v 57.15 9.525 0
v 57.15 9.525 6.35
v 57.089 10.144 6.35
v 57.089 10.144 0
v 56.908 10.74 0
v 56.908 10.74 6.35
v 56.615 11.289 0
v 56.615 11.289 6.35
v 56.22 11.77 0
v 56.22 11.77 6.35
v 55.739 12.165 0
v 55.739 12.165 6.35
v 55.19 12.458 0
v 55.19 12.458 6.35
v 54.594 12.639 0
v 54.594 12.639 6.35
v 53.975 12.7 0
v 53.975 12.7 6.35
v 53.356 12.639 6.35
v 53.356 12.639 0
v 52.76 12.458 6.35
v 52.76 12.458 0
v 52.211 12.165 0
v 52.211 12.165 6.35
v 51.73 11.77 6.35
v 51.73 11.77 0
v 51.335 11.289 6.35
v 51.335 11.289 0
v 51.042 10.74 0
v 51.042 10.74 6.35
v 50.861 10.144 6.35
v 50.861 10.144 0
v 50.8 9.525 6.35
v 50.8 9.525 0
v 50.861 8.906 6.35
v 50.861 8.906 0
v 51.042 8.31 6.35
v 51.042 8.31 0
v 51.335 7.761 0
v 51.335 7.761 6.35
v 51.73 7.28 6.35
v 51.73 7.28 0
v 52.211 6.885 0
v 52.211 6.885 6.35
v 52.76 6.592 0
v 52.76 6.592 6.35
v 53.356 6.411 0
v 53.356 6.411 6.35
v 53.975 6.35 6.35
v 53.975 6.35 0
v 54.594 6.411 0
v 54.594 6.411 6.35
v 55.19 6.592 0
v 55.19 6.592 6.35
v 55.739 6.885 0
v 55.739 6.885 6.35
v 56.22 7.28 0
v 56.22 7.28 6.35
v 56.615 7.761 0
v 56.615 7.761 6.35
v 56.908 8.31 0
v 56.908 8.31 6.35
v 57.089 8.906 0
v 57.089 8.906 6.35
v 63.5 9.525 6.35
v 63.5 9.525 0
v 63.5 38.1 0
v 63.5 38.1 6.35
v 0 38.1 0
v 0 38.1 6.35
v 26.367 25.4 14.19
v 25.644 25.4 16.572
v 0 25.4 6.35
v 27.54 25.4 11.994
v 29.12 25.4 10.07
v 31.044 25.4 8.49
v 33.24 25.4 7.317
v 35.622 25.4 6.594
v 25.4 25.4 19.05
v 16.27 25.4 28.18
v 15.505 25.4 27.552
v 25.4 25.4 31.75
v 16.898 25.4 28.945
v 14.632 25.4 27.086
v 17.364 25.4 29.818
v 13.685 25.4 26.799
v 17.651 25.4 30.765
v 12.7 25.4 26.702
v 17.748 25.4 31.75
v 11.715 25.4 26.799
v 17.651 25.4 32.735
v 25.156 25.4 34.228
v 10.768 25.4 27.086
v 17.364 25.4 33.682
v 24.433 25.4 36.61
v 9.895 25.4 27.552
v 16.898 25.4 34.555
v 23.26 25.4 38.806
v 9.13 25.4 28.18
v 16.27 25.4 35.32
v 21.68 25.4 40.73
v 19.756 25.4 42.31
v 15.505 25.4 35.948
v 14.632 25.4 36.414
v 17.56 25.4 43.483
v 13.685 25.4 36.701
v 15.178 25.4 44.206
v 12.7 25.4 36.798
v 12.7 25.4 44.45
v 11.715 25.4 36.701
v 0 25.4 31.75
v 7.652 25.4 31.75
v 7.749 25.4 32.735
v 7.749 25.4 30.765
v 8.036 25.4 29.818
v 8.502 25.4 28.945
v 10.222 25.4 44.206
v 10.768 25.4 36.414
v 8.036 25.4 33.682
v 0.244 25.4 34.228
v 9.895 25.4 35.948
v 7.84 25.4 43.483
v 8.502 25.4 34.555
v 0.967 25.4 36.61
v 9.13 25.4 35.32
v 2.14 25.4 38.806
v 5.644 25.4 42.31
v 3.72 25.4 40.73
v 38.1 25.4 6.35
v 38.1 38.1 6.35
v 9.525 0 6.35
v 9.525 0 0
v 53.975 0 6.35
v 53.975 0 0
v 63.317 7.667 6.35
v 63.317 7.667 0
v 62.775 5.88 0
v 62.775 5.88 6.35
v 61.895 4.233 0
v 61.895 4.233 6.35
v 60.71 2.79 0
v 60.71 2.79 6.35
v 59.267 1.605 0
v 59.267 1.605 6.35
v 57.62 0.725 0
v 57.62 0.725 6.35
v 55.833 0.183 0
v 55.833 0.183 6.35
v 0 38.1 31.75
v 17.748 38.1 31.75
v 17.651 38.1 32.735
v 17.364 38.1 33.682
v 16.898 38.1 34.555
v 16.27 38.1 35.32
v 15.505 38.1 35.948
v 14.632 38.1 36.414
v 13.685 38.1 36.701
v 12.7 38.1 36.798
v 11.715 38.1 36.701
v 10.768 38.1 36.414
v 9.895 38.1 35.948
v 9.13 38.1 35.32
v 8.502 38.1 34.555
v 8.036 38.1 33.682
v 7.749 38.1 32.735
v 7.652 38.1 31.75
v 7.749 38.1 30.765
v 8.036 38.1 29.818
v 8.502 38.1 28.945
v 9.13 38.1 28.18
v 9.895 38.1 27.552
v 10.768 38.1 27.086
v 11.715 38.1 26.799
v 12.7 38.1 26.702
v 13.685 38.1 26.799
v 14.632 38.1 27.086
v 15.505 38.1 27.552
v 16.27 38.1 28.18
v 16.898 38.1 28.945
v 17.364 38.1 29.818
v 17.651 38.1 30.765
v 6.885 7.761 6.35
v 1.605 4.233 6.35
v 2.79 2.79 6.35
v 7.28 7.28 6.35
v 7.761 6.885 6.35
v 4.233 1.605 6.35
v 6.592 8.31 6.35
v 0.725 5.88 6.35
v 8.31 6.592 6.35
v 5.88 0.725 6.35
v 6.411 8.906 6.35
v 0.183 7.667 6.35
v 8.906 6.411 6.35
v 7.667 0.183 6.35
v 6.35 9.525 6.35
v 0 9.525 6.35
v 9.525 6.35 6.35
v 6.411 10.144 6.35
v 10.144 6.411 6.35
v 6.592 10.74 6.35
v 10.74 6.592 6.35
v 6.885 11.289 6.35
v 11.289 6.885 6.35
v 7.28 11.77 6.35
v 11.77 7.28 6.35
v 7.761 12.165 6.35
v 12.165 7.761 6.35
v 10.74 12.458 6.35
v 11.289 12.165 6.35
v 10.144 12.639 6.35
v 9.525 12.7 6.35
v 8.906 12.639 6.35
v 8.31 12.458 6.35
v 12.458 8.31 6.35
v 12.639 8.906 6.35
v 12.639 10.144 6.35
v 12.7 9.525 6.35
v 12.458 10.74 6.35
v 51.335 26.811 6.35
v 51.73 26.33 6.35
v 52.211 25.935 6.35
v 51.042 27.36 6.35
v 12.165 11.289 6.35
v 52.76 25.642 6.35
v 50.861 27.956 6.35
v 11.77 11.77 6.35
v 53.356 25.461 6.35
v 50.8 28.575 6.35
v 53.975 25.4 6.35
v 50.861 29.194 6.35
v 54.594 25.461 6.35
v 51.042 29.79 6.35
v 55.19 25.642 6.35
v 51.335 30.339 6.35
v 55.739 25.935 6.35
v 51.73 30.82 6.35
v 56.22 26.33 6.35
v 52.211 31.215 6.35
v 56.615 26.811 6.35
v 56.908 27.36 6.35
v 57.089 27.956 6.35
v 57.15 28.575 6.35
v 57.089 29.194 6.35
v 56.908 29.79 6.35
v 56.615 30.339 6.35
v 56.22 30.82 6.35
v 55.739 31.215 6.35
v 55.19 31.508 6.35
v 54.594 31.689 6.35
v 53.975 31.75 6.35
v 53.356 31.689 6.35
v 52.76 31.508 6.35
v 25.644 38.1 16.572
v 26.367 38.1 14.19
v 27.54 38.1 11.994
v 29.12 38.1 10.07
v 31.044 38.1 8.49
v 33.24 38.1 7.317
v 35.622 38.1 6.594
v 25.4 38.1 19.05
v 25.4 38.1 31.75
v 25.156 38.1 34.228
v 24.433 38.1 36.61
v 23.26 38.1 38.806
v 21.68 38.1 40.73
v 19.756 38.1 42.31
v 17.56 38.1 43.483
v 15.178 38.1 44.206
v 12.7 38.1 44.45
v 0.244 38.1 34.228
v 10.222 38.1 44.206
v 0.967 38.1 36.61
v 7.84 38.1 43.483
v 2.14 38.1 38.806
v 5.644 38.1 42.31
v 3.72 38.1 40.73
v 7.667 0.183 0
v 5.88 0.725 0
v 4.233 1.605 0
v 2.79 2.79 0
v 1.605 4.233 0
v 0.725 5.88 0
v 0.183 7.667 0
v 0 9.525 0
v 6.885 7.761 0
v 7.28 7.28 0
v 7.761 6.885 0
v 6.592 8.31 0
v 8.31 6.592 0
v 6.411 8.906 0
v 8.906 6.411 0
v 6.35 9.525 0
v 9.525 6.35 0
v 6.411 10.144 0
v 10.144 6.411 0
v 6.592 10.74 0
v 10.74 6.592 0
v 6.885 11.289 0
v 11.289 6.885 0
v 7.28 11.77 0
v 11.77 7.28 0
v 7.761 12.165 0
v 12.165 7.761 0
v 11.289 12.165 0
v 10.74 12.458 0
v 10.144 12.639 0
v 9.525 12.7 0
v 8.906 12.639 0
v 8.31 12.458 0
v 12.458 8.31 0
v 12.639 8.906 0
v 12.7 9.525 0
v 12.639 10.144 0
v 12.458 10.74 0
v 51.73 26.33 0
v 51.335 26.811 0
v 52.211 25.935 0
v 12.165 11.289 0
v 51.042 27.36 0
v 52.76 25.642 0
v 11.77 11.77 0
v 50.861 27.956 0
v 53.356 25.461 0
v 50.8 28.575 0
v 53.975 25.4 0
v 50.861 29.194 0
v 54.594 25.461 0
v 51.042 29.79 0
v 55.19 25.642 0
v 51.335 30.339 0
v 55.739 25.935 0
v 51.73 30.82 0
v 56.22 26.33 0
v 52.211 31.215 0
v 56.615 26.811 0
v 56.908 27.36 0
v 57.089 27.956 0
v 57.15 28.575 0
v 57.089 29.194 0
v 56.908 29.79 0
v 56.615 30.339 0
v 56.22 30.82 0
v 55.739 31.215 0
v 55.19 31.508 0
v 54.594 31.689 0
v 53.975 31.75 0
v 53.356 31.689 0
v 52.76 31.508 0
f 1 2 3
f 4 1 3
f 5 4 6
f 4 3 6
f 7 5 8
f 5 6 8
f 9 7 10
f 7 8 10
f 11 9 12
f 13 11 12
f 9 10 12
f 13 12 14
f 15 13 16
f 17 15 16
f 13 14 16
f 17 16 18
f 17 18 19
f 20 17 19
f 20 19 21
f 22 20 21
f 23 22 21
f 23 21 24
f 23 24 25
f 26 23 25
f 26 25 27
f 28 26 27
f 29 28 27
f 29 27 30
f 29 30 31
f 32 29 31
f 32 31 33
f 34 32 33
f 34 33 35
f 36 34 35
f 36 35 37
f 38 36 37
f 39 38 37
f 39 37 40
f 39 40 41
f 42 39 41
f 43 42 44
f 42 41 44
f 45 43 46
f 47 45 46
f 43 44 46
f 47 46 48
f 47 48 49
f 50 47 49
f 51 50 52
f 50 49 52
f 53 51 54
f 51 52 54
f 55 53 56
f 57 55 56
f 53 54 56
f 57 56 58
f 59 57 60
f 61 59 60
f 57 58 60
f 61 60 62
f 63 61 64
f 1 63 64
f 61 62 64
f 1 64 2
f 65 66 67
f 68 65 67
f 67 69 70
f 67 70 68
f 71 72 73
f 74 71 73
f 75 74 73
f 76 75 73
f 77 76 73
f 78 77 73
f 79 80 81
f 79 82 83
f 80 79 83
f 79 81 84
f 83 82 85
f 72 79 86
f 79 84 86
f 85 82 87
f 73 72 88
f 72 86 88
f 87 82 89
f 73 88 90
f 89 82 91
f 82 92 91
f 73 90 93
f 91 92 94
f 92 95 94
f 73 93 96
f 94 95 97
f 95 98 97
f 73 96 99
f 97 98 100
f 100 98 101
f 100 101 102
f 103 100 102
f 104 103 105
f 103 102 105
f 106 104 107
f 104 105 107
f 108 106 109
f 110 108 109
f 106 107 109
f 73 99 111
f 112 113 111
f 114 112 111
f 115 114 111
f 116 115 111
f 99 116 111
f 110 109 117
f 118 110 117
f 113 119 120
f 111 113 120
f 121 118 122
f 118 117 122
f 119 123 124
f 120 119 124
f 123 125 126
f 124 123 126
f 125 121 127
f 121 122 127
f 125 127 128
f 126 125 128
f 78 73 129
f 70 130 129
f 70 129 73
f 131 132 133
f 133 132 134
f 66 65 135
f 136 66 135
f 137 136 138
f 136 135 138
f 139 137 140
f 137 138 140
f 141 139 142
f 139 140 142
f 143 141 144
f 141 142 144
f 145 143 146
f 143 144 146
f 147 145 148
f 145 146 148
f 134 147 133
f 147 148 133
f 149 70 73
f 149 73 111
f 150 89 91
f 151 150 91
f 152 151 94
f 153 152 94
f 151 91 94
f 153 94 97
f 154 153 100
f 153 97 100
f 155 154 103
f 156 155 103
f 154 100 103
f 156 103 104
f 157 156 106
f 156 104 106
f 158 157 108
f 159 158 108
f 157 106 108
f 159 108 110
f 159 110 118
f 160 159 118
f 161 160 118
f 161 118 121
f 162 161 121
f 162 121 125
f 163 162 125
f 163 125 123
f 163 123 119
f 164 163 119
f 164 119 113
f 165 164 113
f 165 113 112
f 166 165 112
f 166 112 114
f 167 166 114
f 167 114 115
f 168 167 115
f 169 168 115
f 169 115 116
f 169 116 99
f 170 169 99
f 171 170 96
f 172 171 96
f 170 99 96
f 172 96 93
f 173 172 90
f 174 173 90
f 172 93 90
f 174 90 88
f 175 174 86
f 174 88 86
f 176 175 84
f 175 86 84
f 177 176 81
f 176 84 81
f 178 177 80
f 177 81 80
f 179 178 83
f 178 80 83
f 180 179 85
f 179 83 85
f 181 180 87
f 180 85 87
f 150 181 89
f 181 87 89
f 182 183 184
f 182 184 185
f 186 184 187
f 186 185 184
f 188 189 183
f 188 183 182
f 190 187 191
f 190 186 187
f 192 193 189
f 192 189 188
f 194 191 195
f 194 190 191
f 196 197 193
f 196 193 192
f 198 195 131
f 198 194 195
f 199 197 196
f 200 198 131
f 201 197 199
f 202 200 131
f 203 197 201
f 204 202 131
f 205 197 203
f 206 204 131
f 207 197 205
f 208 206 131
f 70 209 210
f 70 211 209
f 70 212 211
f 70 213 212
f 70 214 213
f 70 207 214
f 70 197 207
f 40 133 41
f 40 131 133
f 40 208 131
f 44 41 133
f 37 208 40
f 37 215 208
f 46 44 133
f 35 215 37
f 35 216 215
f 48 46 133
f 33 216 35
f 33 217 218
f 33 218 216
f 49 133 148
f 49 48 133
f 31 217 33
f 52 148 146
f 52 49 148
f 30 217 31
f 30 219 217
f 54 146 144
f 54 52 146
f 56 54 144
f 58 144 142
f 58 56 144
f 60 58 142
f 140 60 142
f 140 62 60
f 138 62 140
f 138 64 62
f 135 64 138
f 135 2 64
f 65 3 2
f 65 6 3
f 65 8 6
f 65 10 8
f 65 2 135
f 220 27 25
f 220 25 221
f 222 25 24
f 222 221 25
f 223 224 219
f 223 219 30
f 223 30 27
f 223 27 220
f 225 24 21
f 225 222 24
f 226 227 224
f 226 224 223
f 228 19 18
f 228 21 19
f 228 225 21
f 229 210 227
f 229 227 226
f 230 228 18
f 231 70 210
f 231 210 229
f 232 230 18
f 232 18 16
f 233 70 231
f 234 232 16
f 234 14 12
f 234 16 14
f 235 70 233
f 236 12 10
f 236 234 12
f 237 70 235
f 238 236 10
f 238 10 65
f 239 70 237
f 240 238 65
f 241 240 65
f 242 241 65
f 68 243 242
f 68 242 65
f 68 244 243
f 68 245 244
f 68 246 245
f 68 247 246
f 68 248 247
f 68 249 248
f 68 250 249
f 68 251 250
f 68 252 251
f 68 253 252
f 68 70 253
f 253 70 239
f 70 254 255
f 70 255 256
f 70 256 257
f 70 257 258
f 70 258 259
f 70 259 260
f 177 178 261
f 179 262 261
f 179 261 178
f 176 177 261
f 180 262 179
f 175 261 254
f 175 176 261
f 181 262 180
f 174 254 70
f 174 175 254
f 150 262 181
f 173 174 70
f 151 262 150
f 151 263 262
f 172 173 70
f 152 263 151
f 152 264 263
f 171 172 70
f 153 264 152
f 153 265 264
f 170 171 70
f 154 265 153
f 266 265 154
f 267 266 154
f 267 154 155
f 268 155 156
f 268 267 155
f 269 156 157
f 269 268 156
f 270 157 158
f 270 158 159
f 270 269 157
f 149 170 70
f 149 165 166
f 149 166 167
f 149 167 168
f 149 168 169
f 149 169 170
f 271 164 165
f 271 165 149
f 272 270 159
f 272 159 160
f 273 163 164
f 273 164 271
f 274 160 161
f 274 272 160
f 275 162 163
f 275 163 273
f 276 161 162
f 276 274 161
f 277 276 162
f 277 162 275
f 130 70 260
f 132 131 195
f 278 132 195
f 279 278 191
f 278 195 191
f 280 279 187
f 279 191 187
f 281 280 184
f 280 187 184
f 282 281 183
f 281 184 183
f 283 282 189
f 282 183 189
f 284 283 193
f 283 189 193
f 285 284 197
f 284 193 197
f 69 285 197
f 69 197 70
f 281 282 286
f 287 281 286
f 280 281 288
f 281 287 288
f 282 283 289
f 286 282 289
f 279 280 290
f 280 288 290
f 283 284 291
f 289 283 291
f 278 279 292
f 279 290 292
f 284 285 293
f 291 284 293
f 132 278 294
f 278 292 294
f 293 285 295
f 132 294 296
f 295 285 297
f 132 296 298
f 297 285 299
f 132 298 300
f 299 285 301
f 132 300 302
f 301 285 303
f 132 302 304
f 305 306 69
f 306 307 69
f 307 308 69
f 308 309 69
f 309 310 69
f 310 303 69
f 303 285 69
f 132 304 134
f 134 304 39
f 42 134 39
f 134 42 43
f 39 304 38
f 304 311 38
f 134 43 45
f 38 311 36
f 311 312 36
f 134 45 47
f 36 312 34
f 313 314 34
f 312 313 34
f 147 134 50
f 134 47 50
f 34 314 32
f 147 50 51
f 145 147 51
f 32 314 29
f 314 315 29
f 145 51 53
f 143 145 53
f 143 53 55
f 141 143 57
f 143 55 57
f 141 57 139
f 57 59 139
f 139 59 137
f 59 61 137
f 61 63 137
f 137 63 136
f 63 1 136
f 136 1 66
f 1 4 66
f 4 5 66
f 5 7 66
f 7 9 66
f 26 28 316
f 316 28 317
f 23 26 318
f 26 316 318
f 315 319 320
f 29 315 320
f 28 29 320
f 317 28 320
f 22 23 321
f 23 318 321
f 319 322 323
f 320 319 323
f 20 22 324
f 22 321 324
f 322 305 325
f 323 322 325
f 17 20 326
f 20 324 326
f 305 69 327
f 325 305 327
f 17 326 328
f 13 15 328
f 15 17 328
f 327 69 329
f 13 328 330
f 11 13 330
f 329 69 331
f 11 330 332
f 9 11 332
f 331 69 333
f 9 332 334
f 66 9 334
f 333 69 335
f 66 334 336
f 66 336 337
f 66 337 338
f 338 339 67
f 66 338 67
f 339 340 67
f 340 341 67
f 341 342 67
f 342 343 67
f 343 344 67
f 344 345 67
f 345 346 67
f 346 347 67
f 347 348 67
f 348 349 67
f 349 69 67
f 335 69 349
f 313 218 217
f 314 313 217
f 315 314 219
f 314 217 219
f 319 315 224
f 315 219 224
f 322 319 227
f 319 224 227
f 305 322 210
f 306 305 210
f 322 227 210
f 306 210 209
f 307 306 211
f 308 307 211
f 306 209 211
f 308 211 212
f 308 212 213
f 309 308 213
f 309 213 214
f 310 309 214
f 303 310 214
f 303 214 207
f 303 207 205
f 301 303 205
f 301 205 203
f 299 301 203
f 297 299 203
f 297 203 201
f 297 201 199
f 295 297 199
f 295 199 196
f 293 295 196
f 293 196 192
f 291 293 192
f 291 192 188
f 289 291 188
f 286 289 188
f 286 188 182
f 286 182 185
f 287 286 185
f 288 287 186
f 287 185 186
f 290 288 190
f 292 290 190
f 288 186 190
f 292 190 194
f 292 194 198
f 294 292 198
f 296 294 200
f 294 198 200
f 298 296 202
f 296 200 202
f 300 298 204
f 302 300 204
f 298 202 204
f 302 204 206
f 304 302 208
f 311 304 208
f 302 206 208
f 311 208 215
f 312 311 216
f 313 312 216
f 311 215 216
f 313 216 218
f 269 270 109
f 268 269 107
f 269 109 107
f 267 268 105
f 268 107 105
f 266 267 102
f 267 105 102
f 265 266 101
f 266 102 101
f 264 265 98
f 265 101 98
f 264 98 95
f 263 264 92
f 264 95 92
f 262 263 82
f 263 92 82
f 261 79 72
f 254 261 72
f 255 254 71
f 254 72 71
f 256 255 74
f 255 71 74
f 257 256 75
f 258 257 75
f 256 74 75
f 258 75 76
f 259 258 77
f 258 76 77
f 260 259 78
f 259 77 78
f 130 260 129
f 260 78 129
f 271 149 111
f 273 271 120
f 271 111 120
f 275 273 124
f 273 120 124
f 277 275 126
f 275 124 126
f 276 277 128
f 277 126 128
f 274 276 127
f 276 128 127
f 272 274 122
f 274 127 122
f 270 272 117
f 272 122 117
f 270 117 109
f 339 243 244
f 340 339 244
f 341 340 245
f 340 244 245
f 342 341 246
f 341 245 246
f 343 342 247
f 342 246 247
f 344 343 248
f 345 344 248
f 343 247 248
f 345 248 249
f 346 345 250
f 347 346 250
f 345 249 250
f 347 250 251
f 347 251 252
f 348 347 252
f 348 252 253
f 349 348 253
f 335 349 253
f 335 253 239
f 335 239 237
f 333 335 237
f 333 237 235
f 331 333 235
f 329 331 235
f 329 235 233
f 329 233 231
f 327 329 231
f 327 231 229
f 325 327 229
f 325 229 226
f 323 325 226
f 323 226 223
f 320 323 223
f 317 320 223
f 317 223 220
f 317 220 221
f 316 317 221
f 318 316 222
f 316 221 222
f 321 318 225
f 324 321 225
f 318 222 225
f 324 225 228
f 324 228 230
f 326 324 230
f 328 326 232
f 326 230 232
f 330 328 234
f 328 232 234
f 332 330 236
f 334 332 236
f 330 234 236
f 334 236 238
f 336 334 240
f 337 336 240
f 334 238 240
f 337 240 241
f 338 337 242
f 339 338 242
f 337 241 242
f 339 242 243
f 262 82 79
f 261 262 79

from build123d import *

# Parameters (mm, degrees)
F0_W     = 63.5
F0_H     = 38.1
F1_DEPTH = 6.35
F2_R     = 3.175
F3_DEPTH = 25.4
F4_W     = 38.1
F4_H     = 38.1
F5_DEPTH = 12.7
F6_R     = 5.0483278961
F7_DEPTH = 25.4


with BuildPart() as f1:
    # F0 (on Top) → F1 (new body)
    with BuildSketch(Plane.XY):
        with Locations((31.75, 19.05)):
            Rectangle(F0_W, F0_H)
    extrude(amount=F1_DEPTH)

    # F2 (on face) → F3 (cut)
    with BuildSketch(Plane.XY.offset(6.35)):
        with Locations((53.975, 28.575)):
            Circle(F2_R)
        with Locations((53.975, 9.525)):
            Circle(F2_R)
        with Locations((9.525, 9.525)):
            Circle(F2_R)
        with BuildLine():
            ThreePointArc((9.525, 0), (2.7898079092, 2.7898079092), (0, 9.525))
            Line((0, 9.525), (0, 0))
            Line((0, 0), (9.525, 0))
        make_face()
        with BuildLine():
            ThreePointArc((63.5, 9.525), (60.7101920908, 2.7898079092), (53.975, 0))
            Line((53.975, 0), (63.5, 0))
            Line((63.5, 0), (63.5, 9.525))
        make_face()
    extrude(amount=-F3_DEPTH, mode=Mode.SUBTRACT)


with BuildPart() as f5:
    # F4 (on face) → F5 (new body)
    with BuildSketch(Plane(origin=(0, 38.1, 0), x_dir=(-1, 0, 0), z_dir=(0, 1, 0))):
        with Locations((-19.05, 25.4)):
            Rectangle(F4_W, F4_H)
    extrude(amount=-F5_DEPTH)

    # F6 (on face) → F7 (cut)
    with BuildSketch(Plane.XZ.offset(-25.4)):
        with BuildLine():
            Line((38.1, 44.45), (12.7, 44.45))
            ThreePointArc((12.7, 44.45), (21.6802561211, 40.7302561211), (25.4, 31.75))
            Line((25.4, 31.75), (25.4, 19.05))
            ThreePointArc((25.4, 19.05), (29.1197438789, 10.0697438789), (38.1, 6.35))
            Line((38.1, 6.35), (38.1, 44.45))
        make_face()
        with BuildLine():
            ThreePointArc((0, 31.75), (3.7197438789, 40.7302561211), (12.7, 44.45))
            Line((12.7, 44.45), (0, 44.45))
            Line((0, 44.45), (0, 31.75))
        make_face()
        with Locations((12.7, 31.75)):
            Circle(F6_R)
    extrude(amount=-F7_DEPTH, mode=Mode.SUBTRACT)


solid = Compound([f1.part, f5.part])
